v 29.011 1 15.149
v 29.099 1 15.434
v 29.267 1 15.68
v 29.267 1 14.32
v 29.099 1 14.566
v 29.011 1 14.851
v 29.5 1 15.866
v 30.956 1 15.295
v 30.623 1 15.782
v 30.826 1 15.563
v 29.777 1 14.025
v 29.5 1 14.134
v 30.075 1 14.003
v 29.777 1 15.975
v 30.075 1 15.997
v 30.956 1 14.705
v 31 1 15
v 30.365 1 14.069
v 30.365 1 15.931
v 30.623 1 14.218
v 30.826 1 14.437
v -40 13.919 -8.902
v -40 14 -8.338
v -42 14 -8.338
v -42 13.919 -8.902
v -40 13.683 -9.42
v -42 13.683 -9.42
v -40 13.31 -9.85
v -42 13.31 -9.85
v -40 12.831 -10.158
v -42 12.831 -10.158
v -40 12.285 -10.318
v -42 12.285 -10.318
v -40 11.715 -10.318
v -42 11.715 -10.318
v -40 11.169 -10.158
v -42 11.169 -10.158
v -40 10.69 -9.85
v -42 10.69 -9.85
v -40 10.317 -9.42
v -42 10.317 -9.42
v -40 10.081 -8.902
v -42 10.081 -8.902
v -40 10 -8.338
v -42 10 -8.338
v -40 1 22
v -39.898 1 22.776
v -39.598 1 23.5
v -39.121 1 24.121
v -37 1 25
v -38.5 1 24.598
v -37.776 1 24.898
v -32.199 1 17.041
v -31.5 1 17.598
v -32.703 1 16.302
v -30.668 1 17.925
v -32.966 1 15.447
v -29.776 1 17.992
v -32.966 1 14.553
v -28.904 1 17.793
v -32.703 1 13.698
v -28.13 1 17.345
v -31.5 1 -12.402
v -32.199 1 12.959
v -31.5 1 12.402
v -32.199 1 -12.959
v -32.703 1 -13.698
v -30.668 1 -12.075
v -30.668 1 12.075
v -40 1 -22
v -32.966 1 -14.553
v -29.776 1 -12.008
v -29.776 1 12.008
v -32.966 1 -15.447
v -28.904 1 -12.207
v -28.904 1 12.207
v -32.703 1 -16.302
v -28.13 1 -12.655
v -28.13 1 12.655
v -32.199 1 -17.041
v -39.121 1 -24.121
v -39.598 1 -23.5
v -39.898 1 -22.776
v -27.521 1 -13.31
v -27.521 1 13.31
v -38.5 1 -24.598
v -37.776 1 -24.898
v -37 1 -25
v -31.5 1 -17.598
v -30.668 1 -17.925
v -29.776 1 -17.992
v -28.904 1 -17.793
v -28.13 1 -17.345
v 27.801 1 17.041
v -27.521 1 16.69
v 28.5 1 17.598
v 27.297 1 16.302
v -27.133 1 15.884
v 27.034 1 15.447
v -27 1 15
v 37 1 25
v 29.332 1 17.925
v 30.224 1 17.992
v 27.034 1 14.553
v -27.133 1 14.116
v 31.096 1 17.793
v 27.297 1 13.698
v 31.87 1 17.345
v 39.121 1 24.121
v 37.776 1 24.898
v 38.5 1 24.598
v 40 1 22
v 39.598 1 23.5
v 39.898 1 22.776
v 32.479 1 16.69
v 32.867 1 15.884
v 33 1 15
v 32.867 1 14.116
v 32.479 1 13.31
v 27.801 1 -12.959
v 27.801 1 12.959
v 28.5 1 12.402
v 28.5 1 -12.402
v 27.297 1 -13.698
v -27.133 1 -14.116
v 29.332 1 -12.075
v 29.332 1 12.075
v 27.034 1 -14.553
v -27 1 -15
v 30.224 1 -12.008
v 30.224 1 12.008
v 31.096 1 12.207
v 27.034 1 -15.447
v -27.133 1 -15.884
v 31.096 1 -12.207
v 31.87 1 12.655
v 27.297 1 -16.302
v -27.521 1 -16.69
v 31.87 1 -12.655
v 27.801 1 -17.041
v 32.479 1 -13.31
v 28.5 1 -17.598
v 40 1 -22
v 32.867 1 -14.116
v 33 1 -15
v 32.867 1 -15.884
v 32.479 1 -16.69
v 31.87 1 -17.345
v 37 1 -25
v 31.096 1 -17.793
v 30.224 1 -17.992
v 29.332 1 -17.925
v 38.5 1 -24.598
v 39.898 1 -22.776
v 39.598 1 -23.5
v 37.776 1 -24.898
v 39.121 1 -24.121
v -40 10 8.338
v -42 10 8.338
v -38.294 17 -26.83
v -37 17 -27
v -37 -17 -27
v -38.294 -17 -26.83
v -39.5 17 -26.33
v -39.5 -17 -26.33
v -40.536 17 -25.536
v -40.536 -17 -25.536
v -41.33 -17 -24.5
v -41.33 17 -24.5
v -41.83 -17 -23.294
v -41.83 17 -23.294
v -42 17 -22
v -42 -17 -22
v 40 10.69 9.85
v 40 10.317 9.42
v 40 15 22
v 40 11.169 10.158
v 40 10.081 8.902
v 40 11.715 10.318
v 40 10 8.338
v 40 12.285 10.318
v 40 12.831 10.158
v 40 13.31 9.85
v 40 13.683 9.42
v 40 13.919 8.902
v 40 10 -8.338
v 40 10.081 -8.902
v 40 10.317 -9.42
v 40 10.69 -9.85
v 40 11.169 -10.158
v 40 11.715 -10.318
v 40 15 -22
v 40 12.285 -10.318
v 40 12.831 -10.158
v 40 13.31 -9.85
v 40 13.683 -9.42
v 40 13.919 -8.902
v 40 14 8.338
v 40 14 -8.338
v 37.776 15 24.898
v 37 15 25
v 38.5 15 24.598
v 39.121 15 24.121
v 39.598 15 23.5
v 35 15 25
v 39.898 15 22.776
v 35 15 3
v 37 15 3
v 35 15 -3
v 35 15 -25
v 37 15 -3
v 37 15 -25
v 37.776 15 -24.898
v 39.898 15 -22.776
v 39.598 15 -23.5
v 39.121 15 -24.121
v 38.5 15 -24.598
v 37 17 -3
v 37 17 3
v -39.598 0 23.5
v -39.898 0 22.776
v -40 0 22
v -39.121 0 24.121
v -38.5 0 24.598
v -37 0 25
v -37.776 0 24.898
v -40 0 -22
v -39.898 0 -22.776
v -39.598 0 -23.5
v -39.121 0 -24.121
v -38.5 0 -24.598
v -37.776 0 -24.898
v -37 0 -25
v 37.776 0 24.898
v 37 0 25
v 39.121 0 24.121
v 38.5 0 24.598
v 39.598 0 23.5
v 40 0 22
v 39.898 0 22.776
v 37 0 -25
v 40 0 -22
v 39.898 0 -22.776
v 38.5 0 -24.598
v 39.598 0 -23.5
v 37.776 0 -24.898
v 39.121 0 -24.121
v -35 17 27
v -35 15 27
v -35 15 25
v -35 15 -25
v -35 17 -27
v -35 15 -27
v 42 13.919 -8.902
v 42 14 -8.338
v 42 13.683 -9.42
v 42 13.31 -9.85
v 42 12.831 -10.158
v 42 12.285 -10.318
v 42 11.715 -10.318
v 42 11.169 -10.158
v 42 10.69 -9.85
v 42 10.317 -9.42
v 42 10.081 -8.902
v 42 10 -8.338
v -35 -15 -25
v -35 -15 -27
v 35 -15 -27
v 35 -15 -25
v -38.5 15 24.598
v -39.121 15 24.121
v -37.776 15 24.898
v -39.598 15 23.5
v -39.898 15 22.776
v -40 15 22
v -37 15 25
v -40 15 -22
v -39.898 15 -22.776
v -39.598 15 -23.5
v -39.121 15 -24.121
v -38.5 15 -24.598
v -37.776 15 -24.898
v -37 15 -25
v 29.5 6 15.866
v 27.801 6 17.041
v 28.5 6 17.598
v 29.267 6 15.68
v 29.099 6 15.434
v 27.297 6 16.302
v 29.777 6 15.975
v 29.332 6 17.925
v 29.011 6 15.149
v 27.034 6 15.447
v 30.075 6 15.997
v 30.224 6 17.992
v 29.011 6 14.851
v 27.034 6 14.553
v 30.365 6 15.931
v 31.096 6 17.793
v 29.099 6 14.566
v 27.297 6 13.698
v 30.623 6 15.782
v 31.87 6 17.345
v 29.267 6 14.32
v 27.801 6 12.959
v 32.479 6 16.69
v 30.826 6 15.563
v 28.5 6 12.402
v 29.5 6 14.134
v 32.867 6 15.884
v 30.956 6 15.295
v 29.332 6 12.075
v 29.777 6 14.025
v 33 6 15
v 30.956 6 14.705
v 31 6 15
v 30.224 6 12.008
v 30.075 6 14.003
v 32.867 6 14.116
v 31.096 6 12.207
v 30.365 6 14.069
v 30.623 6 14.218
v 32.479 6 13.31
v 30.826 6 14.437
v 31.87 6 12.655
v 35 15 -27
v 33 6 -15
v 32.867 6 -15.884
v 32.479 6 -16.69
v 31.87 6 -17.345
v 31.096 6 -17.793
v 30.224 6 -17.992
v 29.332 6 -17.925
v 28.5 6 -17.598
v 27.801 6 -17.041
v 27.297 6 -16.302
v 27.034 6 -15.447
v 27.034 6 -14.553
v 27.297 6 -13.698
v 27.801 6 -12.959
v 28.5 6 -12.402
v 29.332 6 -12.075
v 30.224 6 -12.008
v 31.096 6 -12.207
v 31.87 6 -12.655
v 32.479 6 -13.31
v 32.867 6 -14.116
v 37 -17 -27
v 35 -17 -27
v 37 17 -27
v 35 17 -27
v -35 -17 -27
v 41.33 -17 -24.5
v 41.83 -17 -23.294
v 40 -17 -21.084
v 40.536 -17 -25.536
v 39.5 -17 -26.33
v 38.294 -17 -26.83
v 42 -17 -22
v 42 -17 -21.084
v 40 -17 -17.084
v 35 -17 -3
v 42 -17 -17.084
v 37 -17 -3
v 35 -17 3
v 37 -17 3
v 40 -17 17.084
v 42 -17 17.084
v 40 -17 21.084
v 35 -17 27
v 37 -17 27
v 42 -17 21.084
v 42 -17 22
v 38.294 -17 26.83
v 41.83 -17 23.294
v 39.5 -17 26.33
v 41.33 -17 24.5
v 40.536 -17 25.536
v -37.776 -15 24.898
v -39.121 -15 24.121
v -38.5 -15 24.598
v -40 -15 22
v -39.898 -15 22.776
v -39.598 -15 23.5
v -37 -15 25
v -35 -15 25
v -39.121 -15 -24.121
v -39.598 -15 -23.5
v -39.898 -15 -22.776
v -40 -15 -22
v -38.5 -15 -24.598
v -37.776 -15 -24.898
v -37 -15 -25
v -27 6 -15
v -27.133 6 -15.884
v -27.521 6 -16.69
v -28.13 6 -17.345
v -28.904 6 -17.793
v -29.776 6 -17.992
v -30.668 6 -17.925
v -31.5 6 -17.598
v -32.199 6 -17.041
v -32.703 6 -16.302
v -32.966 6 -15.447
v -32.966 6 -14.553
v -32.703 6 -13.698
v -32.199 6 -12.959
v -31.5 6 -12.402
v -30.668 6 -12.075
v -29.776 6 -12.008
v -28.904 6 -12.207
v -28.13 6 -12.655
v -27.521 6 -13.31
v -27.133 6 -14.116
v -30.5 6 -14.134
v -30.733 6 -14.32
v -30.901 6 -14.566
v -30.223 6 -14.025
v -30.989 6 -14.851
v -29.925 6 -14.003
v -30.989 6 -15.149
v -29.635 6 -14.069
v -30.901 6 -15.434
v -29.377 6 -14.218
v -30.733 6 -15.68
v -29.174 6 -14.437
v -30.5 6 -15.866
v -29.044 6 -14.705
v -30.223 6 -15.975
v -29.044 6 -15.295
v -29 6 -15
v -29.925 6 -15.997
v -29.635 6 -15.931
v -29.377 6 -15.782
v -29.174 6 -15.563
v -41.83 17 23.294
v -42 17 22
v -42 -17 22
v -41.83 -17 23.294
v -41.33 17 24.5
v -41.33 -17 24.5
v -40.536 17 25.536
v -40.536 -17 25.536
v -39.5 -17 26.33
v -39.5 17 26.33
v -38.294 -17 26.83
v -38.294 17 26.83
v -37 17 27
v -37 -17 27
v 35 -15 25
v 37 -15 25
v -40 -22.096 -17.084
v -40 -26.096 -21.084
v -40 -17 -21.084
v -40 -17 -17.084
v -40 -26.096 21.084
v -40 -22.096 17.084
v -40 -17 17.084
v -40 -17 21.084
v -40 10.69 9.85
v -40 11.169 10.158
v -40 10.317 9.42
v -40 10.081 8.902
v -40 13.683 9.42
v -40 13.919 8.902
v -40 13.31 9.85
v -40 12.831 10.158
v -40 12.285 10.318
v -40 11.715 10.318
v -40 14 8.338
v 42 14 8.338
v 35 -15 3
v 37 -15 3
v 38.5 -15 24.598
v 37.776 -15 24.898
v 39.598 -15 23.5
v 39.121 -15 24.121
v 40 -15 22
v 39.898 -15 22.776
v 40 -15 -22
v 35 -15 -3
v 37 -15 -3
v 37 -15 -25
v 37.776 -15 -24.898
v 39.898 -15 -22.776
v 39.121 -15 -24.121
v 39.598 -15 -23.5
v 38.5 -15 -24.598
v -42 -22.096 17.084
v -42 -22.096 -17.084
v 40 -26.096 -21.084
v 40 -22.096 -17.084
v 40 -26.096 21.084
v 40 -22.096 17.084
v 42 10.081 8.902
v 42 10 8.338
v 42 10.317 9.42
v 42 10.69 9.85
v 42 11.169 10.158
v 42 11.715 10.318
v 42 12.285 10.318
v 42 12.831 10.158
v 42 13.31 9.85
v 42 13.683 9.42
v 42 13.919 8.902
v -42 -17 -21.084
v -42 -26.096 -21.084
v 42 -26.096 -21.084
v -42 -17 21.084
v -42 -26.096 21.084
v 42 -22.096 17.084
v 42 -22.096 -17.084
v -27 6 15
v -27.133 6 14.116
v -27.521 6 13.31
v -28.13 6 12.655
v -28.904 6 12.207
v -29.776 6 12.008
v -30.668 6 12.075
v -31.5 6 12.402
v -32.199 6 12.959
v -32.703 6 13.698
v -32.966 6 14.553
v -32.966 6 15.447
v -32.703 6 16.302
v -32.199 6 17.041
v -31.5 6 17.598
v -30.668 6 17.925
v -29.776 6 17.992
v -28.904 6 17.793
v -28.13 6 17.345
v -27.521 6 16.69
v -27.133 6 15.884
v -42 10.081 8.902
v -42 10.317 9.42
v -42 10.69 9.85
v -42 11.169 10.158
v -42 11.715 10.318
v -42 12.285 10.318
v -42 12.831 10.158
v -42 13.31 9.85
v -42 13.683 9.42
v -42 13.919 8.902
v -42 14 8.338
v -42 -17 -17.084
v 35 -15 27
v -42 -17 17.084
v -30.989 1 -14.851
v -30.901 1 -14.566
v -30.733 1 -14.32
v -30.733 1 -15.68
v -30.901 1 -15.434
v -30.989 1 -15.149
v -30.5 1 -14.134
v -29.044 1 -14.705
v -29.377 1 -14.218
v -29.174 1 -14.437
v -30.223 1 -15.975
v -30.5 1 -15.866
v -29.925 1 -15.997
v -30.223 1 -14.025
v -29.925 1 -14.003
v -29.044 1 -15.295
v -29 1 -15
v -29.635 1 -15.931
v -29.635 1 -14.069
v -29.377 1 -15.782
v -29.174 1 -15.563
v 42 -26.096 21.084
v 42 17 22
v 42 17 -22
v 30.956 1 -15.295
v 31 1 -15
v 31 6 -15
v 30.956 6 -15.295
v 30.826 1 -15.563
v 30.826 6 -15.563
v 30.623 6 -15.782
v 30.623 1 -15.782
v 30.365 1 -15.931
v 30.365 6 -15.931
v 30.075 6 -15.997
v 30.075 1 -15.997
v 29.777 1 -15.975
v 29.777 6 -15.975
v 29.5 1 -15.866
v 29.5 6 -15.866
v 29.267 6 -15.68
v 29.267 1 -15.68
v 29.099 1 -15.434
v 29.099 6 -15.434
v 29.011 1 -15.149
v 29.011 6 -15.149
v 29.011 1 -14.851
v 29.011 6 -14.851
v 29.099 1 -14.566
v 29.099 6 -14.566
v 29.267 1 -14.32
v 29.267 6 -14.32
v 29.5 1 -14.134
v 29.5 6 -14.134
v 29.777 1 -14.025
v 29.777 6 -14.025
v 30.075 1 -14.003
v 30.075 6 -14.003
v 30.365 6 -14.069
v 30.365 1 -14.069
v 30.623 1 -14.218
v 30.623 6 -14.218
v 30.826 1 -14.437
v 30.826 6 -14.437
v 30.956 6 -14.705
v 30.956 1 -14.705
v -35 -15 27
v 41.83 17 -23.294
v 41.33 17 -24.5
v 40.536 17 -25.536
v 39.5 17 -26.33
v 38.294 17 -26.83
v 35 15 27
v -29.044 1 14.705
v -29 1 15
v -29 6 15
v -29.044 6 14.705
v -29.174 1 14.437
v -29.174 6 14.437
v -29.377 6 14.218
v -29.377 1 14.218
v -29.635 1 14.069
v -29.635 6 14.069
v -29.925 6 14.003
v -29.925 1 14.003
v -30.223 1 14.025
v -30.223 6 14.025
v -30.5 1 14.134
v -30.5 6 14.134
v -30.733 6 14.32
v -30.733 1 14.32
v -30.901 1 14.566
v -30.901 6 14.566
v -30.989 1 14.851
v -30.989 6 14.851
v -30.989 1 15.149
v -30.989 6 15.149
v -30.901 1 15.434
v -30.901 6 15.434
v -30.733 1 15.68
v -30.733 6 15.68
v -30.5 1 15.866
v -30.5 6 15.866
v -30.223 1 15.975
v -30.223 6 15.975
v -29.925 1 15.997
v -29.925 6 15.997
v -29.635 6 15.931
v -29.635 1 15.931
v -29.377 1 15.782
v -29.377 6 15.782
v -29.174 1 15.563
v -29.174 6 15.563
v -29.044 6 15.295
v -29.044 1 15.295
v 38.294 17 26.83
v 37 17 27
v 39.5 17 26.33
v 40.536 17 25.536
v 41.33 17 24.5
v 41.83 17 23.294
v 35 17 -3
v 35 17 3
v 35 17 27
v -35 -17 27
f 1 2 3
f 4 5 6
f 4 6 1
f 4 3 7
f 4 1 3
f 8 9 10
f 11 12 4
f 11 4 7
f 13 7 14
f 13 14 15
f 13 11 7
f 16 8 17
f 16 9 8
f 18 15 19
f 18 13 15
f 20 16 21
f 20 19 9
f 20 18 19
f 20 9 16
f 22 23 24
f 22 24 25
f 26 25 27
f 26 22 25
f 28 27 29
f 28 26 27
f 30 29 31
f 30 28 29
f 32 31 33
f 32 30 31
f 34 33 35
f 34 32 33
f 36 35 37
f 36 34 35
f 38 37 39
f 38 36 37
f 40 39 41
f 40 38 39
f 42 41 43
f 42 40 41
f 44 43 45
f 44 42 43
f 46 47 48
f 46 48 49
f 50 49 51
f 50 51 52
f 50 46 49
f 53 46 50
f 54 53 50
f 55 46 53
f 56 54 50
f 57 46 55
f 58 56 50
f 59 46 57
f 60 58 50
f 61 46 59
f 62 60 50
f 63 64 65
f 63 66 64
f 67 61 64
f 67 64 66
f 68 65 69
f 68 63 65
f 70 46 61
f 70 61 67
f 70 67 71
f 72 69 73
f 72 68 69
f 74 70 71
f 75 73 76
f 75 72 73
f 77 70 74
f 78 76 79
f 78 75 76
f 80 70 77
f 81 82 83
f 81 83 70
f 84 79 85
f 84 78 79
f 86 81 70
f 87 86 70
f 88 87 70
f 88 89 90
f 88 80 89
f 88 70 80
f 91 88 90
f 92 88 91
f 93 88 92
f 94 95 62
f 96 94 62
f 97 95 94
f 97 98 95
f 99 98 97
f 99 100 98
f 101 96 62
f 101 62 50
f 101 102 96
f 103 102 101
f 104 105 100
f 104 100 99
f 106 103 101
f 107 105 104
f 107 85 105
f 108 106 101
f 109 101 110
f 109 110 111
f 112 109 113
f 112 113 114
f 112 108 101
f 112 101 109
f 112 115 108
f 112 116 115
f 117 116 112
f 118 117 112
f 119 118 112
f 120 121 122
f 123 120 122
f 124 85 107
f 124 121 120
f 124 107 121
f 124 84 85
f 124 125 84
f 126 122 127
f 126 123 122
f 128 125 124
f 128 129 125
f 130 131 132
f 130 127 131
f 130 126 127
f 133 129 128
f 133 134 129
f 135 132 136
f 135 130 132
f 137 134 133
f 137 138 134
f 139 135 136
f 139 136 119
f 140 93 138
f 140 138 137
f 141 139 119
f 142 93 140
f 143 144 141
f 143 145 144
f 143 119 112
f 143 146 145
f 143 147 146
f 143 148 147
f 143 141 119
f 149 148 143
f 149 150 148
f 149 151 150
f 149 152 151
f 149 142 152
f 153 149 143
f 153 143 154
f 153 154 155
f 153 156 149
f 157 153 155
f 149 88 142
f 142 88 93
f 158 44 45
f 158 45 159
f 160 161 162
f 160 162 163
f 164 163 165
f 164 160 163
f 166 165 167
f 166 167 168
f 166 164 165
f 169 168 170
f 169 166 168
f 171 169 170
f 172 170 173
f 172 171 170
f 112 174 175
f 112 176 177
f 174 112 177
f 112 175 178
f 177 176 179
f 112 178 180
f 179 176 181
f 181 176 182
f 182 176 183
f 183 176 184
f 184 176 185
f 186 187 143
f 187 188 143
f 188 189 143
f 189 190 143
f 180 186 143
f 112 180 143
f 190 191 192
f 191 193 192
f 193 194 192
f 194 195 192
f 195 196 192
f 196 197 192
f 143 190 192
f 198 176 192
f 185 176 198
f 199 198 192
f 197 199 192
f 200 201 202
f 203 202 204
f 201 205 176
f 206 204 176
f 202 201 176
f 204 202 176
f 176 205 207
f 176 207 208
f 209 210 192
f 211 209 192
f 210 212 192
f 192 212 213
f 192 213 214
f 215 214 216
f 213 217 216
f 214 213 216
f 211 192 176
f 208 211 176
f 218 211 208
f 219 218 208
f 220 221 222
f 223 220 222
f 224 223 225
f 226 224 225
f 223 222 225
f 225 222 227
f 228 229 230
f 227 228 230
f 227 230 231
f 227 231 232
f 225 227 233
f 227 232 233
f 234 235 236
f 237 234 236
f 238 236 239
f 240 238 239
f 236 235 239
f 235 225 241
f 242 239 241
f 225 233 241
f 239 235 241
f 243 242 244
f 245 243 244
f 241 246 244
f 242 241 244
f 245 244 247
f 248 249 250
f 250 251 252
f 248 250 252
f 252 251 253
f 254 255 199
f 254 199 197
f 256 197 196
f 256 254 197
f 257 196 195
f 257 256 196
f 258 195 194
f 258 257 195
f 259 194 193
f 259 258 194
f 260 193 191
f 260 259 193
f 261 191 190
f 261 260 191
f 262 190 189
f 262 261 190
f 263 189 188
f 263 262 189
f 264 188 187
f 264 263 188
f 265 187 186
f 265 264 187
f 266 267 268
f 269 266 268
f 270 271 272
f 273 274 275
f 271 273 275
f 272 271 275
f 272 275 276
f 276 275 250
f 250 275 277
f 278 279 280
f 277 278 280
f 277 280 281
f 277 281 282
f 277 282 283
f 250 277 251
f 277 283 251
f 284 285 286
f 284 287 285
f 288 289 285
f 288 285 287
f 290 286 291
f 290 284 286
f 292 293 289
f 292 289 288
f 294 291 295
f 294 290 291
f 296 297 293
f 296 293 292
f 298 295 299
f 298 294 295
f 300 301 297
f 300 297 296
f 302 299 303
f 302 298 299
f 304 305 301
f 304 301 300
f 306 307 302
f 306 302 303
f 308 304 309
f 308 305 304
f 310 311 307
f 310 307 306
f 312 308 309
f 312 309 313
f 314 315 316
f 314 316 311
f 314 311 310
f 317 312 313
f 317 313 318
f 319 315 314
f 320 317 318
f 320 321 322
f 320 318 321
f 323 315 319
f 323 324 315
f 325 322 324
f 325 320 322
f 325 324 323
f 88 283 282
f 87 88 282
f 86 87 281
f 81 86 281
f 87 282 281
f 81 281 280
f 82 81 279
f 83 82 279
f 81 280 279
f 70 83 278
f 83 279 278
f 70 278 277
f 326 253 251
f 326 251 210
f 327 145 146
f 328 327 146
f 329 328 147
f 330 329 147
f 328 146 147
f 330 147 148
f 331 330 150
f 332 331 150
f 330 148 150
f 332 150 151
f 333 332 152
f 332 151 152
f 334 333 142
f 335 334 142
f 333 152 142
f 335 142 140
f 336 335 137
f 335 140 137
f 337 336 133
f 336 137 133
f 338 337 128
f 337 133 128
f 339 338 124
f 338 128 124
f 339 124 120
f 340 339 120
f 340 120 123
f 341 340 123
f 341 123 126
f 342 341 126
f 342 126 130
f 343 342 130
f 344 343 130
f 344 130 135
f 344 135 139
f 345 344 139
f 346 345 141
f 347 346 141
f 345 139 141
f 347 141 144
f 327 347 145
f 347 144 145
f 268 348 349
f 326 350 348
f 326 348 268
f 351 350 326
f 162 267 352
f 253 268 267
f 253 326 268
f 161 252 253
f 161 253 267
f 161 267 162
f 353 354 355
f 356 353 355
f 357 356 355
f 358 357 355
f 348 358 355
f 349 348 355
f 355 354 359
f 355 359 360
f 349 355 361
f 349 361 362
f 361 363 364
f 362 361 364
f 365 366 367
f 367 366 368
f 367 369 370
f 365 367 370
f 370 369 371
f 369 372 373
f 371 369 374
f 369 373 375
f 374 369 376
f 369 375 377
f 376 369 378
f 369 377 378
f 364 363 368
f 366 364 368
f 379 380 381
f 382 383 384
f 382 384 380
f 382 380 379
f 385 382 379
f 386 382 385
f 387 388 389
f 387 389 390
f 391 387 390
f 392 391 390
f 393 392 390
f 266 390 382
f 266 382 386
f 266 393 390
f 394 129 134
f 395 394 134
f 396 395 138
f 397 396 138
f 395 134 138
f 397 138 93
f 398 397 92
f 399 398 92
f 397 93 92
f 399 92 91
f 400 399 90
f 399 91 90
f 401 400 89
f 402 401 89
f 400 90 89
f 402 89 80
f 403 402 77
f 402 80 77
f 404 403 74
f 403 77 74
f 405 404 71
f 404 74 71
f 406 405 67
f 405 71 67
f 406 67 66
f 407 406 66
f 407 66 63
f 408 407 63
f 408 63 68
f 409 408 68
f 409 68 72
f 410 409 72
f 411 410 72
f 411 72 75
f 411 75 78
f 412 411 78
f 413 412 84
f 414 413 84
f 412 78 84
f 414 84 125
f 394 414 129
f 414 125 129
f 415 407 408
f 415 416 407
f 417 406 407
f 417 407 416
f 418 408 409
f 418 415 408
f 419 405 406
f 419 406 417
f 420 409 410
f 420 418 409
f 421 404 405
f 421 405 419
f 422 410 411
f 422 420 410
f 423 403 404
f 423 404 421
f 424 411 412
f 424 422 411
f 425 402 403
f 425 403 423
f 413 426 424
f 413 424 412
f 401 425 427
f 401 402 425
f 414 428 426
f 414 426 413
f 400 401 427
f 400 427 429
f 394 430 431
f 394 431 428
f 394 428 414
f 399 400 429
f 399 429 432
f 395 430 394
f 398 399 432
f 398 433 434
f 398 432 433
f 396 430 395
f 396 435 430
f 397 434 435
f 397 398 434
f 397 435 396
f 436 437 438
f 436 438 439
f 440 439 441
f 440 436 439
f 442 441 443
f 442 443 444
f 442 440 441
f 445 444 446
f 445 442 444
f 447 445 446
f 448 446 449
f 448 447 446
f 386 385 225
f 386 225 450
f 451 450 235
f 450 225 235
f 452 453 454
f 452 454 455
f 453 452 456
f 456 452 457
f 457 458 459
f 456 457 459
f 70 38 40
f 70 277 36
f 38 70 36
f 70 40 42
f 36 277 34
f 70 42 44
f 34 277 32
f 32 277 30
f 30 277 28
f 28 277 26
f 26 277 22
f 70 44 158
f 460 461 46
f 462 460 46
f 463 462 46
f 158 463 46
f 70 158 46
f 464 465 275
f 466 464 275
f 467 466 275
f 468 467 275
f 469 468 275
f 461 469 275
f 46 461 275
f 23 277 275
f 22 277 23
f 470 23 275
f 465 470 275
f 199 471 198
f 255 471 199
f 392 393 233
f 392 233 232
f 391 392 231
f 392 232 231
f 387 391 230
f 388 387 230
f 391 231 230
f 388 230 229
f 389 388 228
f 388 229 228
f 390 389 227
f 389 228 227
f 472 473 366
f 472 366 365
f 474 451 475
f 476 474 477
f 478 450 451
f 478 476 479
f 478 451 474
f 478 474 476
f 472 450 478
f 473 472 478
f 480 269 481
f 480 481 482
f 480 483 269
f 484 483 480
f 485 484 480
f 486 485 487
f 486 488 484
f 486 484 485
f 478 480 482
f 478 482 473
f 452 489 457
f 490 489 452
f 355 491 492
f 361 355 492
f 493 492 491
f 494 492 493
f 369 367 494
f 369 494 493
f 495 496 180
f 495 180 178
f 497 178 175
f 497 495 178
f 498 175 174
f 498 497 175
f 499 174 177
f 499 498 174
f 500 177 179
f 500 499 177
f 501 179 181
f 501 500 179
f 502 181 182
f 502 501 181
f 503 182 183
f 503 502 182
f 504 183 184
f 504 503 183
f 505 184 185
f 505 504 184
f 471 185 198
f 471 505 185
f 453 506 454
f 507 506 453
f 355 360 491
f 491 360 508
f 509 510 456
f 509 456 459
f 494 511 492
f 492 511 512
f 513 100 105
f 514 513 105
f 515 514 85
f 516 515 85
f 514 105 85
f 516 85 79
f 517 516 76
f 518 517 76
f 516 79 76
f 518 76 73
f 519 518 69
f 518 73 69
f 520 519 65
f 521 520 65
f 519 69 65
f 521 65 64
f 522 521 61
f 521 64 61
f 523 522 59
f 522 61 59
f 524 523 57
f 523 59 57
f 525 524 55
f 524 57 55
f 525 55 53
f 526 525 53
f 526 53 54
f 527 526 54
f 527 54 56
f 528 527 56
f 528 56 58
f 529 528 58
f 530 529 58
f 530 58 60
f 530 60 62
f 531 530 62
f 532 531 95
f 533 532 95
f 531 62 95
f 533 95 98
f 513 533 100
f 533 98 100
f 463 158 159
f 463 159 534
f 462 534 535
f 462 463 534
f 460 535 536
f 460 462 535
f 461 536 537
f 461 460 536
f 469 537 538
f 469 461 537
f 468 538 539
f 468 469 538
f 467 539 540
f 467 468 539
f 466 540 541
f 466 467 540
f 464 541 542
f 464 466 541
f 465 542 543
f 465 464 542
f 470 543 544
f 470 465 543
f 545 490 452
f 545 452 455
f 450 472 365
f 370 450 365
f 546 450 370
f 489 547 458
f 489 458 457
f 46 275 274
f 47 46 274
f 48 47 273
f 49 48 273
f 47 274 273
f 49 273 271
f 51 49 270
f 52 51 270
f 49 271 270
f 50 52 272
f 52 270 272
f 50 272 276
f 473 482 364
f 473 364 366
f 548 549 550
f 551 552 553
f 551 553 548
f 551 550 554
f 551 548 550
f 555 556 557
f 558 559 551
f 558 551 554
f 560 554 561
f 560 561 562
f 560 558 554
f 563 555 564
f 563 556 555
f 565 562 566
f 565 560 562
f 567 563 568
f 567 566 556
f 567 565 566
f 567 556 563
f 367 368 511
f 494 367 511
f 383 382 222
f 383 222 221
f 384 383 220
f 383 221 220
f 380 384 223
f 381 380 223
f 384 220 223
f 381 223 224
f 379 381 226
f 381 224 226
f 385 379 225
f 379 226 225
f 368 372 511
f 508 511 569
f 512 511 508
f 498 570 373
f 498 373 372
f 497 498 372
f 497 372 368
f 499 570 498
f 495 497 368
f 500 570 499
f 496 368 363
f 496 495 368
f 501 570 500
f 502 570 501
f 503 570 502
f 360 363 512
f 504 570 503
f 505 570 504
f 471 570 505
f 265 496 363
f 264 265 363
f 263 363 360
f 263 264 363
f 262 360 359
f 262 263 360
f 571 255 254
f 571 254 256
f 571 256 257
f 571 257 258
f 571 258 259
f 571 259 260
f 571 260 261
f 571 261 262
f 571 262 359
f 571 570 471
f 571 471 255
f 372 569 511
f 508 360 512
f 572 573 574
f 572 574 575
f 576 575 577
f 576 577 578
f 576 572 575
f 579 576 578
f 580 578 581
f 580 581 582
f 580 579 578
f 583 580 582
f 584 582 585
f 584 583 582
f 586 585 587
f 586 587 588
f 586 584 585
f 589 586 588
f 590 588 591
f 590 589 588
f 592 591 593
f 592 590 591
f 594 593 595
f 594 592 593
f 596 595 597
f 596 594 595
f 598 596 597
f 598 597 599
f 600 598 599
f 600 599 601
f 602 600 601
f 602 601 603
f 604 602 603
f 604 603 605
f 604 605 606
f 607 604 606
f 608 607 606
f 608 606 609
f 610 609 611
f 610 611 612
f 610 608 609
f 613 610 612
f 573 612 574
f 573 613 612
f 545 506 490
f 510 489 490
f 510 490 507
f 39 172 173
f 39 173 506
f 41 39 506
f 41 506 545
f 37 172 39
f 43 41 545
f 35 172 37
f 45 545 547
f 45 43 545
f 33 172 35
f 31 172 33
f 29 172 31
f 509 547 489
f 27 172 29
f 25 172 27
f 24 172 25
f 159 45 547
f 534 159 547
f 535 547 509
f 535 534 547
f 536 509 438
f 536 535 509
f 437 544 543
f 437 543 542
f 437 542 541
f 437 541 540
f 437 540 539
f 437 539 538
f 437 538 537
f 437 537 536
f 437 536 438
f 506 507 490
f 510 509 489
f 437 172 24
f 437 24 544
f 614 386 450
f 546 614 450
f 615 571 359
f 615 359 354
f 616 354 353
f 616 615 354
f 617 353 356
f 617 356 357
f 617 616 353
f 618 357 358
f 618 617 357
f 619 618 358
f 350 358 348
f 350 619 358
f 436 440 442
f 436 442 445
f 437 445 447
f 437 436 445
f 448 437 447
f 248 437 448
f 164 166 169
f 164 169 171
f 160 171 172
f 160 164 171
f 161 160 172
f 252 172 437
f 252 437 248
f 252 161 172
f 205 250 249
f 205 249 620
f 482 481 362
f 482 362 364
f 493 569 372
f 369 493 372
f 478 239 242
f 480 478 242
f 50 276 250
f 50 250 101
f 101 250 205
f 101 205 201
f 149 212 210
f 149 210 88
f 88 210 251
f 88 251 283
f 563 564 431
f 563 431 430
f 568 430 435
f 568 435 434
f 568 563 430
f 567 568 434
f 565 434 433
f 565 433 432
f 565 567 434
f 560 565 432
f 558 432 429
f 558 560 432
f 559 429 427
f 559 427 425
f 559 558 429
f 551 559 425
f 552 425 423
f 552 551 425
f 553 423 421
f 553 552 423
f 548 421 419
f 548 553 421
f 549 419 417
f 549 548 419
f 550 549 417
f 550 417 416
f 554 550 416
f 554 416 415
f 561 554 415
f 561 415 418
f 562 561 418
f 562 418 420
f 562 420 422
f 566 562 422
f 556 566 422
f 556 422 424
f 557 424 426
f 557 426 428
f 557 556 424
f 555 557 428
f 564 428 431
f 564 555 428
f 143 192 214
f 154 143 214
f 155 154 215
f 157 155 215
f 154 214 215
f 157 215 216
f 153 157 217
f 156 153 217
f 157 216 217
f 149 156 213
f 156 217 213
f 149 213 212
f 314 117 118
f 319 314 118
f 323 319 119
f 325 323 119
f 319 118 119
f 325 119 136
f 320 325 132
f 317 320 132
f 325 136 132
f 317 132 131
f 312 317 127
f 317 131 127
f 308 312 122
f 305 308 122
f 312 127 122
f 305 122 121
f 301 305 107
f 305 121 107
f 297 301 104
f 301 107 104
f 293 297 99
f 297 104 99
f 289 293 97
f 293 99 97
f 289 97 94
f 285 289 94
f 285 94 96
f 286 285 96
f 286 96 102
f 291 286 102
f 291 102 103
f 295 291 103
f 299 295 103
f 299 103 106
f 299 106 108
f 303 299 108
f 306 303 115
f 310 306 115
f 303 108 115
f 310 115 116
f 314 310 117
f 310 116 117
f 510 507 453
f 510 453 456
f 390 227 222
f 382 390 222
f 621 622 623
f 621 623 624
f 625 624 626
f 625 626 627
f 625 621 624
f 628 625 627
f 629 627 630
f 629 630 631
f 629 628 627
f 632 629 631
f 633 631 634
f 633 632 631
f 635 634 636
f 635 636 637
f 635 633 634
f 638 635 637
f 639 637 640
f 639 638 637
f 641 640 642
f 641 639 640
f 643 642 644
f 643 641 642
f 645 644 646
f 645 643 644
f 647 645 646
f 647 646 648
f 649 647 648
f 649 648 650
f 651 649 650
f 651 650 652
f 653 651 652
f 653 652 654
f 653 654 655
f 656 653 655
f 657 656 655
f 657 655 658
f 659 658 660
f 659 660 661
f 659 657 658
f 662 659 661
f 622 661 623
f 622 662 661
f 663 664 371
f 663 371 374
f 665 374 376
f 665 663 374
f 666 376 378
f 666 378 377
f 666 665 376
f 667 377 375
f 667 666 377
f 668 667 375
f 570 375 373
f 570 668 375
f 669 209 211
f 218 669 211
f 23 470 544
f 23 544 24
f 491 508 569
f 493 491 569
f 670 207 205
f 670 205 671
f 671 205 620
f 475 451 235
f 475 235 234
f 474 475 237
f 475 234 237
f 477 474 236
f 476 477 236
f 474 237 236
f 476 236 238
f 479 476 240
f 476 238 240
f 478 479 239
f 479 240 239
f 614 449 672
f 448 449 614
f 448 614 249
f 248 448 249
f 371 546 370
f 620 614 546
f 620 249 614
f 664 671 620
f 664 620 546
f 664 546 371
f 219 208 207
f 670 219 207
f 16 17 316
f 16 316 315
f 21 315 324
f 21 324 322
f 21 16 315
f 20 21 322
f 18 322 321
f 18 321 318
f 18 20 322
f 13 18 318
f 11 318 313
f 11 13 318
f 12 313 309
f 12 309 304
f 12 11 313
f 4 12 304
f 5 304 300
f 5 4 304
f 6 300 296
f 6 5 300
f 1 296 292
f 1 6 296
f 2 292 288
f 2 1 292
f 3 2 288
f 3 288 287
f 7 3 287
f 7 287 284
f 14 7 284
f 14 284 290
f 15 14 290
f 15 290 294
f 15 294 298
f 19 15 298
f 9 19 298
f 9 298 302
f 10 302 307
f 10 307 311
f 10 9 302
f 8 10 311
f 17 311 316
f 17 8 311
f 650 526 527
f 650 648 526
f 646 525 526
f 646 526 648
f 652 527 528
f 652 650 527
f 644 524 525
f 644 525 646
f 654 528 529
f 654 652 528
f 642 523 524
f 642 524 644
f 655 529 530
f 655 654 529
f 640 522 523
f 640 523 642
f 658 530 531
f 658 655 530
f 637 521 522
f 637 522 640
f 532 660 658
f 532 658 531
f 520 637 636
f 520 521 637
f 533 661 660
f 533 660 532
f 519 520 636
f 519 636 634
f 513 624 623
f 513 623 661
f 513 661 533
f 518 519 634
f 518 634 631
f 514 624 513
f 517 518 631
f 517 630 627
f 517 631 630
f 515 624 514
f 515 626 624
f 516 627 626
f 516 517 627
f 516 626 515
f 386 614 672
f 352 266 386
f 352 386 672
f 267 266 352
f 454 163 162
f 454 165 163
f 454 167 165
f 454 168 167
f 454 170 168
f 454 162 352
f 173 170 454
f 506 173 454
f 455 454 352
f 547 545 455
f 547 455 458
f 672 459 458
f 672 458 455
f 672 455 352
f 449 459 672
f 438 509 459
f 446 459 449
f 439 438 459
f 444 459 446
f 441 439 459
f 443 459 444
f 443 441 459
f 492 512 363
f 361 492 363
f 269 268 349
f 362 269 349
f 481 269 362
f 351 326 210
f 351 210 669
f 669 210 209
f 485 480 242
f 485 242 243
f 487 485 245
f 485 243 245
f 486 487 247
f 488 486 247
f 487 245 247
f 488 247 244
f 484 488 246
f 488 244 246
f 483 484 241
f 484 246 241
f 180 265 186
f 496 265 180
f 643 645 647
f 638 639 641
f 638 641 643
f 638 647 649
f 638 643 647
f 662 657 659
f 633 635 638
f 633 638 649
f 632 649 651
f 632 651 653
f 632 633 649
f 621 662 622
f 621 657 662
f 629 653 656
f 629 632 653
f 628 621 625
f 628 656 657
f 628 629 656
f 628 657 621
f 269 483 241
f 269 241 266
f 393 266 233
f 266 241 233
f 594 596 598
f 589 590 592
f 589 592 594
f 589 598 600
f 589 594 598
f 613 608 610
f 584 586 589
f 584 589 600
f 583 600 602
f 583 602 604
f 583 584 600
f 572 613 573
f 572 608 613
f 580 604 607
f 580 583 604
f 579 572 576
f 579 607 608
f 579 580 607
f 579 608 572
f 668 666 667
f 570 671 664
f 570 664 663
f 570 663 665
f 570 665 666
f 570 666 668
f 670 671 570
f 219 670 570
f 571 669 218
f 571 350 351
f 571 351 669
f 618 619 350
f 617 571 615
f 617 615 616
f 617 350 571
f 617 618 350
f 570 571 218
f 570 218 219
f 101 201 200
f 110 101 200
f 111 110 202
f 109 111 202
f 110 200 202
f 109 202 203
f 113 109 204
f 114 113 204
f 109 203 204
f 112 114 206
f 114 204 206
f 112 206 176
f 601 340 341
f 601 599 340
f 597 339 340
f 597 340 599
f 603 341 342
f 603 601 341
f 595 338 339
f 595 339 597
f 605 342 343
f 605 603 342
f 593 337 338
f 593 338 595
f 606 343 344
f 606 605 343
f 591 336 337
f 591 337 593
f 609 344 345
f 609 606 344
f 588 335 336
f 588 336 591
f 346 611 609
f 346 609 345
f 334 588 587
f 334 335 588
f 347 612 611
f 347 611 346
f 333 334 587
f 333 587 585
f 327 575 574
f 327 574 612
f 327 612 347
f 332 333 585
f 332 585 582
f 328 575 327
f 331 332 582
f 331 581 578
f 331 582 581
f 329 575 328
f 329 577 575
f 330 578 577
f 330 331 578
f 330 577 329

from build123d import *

# Parameters (mm, degrees)
EXTRUDE_THIN1_DEPTH      = 15
EXTRUDE_THIN1_DEPTH_BACK = 15
BOSS_EXTRUDE1_DEPTH      = 1
SKETCH3_R                = 3
SKETCH3_R_2              = 1
BOSS_EXTRUDE2_DEPTH      = 5
BOSS_EXTRUDE3_DEPTH      = 2
BOSS_EXTRUDE4_START      = -30
BOSS_EXTRUDE4_DEPTH      = 2
SKETCH5_W                = 34.167254682
SKETCH5_H                = 5.095662734
BOSS_EXTRUDE5_DEPTH      = 2
BOSS_EXTRUDE6_START      = -84
SKETCH5_3_W              = 34.167254682
SKETCH5_3_H              = 5.095662734
BOSS_EXTRUDE6_DEPTH      = 2
CUT_EXTRUDE1_DEPTH       = 85


with BuildPart() as part:
    # Sketch1 → Extrude-Thin1 (new body, two sides)
    with BuildSketch(Plane(origin=(0, 0, 0), x_dir=(1, 0, 0), z_dir=(0, 1, 0))) as extrude_thin1_sk:
        with BuildLine():
            Line((-42, 22), (-42, -22))
            ThreePointArc((-42, -22), (-40.535533906, -25.535533906), (-37, -27))
            Line((-37, -27), (37, -27))
            ThreePointArc((37, -27), (40.535533906, -25.535533906), (42, -22))
            Line((42, -22), (42, 22))
            ThreePointArc((42, 22), (40.535533906, 25.535533906), (37, 27))
            Line((37, 27), (-37, 27))
            ThreePointArc((-37, 27), (-40.535533906, 25.535533906), (-42, 22))
        make_face()
        with BuildLine():
            Line((-40, 22), (-40, -22))
            ThreePointArc((-40, -22), (-39.121320344, -24.121320344), (-37, -25))
            Line((-37, -25), (37, -25))
            ThreePointArc((37, -25), (39.121320344, -24.121320344), (40, -22))
            Line((40, -22), (40, 22))
            ThreePointArc((40, 22), (39.121320344, 24.121320344), (37, 25))
            Line((37, 25), (-37, 25))
            ThreePointArc((-37, 25), (-39.121320344, 24.121320344), (-40, 22))
        make_face(mode=Mode.SUBTRACT)
    extrude(amount=EXTRUDE_THIN1_DEPTH)
    extrude(extrude_thin1_sk.sketch, amount=-EXTRUDE_THIN1_DEPTH_BACK)

    # Sketch1<2> → Boss-Extrude1 (add)
    with BuildSketch(Plane(origin=(0, 0, 0), x_dir=(1, 0, 0), z_dir=(0, 1, 0))):
        with BuildLine():
            Line((-37, -25), (37, -25))
            ThreePointArc((37, -25), (39.121320344, -24.121320344), (40, -22))
            Line((40, -22), (40, 22))
            ThreePointArc((40, 22), (39.121320344, 24.121320344), (37, 25))
            Line((37, 25), (-37, 25))
            ThreePointArc((-37, 25), (-39.121320344, 24.121320344), (-40, 22))
            Line((-40, 22), (-40, -22))
            ThreePointArc((-40, -22), (-39.121320344, -24.121320344), (-37, -25))
        make_face()
    extrude(amount=BOSS_EXTRUDE1_DEPTH)

    # Sketch3 → Boss-Extrude2 (add)
    with BuildSketch(Plane(origin=(0, 1, 0), x_dir=(1, 0, 0), z_dir=(0, 1, 0))):
        with Locations((-30, 15)):
            Circle(SKETCH3_R)
        with Locations((-30, 15)):
            Circle(SKETCH3_R_2, mode=Mode.SUBTRACT)
        with Locations((30, 15)):
            Circle(SKETCH3_R)
        with Locations((30, 15)):
            Circle(SKETCH3_R_2, mode=Mode.SUBTRACT)
        with Locations((30, -15)):
            Circle(SKETCH3_R)
        with Locations((30, -15)):
            Circle(SKETCH3_R_2, mode=Mode.SUBTRACT)
        with Locations((-30, -15)):
            Circle(SKETCH3_R)
        with Locations((-30, -15)):
            Circle(SKETCH3_R_2, mode=Mode.SUBTRACT)
    extrude(amount=BOSS_EXTRUDE2_DEPTH)

    # Sketch4 → Boss-Extrude3 (add)
    with BuildSketch(Plane(origin=(0, 15, 0), x_dir=(1, 0, 0), z_dir=(0, 1, 0))):
        with BuildLine():
            Line((-35, 25), (-35, 27))
            Line((-35, 27), (-37, 27))
            ThreePointArc((-37, 27), (-40.535533906, 25.535533906), (-42, 22))
            Line((-42, 22), (-42, -22))
            ThreePointArc((-42, -22), (-40.535533906, -25.535533906), (-37, -27))
            Line((-37, -27), (-35, -27))
            Line((-35, -27), (-35, -25))
            Line((-35, -25), (-37, -25))
            ThreePointArc((-37, -25), (-39.121320344, -24.121320344), (-40, -22))
            Line((-40, -22), (-40, 22))
            ThreePointArc((-40, 22), (-39.121320344, 24.121320344), (-37, 25))
            Line((-37, 25), (-35, 25))
        make_face()
        with BuildLine():
            Line((-35, -25), (-35, 25))
            Line((-35, 25), (-37, 25))
            ThreePointArc((-37, 25), (-39.121320344, 24.121320344), (-40, 22))
            Line((-40, 22), (-40, -22))
            ThreePointArc((-40, -22), (-39.121320344, -24.121320344), (-37, -25))
            Line((-37, -25), (-35, -25))
        make_face()
        with BuildLine():
            Line((37, 25), (35, 25))
            Line((35, 25), (35, 3))
            Line((35, 3), (37, 3))
            Line((37, 3), (37, -3))
            Line((37, -3), (35, -3))
            Line((35, -3), (35, -25))
            Line((35, -25), (37, -25))
            ThreePointArc((37, -25), (39.121320344, -24.121320344), (40, -22))
            Line((40, -22), (40, 22))
            ThreePointArc((40, 22), (39.121320344, 24.121320344), (37, 25))
        make_face()
        with BuildLine():
            Line((37, 27), (35, 27))
            Line((35, 27), (35, 25))
            Line((35, 25), (37, 25))
            ThreePointArc((37, 25), (39.121320344, 24.121320344), (40, 22))
            Line((40, 22), (40, -22))
            ThreePointArc((40, -22), (39.121320344, -24.121320344), (37, -25))
            Line((37, -25), (35, -25))
            Line((35, -25), (35, -27))
            Line((35, -27), (37, -27))
            ThreePointArc((37, -27), (40.535533906, -25.535533906), (42, -22))
            Line((42, -22), (42, 22))
            ThreePointArc((42, 22), (40.535533906, 25.535533906), (37, 27))
        make_face()
    extrude(amount=BOSS_EXTRUDE3_DEPTH)

    # Sketch4<3> → Boss-Extrude4 (add)
    with BuildSketch(Plane(origin=(0, 15, 0), x_dir=(1, 0, 0), z_dir=(0, 1, 0)).offset(BOSS_EXTRUDE4_START)):
        with BuildLine():
            Line((-35, -25), (-35, 25))
            Line((-35, 25), (-37, 25))
            ThreePointArc((-37, 25), (-39.121320344, 24.121320344), (-40, 22))
            Line((-40, 22), (-40, -22))
            ThreePointArc((-40, -22), (-39.121320344, -24.121320344), (-37, -25))
            Line((-37, -25), (-35, -25))
        make_face()
        with BuildLine():
            Line((-35, 25), (-35, 27))
            Line((-35, 27), (-37, 27))
            ThreePointArc((-37, 27), (-40.535533906, 25.535533906), (-42, 22))
            Line((-42, 22), (-42, -22))
            ThreePointArc((-42, -22), (-40.535533906, -25.535533906), (-37, -27))
            Line((-37, -27), (-35, -27))
            Line((-35, -27), (-35, -25))
            Line((-35, -25), (-37, -25))
            ThreePointArc((-37, -25), (-39.121320344, -24.121320344), (-40, -22))
            Line((-40, -22), (-40, 22))
            ThreePointArc((-40, 22), (-39.121320344, 24.121320344), (-37, 25))
            Line((-37, 25), (-35, 25))
        make_face()
        with BuildLine():
            Line((37, 25), (35, 25))
            Line((35, 25), (35, 3))
            Line((35, 3), (37, 3))
            Line((37, 3), (37, -3))
            Line((37, -3), (35, -3))
            Line((35, -3), (35, -25))
            Line((35, -25), (37, -25))
            ThreePointArc((37, -25), (39.121320344, -24.121320344), (40, -22))
            Line((40, -22), (40, 22))
            ThreePointArc((40, 22), (39.121320344, 24.121320344), (37, 25))
        make_face()
        with BuildLine():
            Line((37, 27), (35, 27))
            Line((35, 27), (35, 25))
            Line((35, 25), (37, 25))
            ThreePointArc((37, 25), (39.121320344, 24.121320344), (40, 22))
            Line((40, 22), (40, -22))
            ThreePointArc((40, -22), (39.121320344, -24.121320344), (37, -25))
            Line((37, -25), (35, -25))
            Line((35, -25), (35, -27))
            Line((35, -27), (37, -27))
            ThreePointArc((37, -27), (40.535533906, -25.535533906), (42, -22))
            Line((42, -22), (42, 22))
            ThreePointArc((42, 22), (40.535533906, 25.535533906), (37, 27))
        make_face()
    extrude(amount=-BOSS_EXTRUDE4_DEPTH)

    # Sketch5 → Boss-Extrude5 (add)
    with BuildSketch(Plane.ZY.offset(42)):
        Polygon((21.083627341, -7.904337266), (-21.083627341, -7.904337266), (-21.083627341, -17), (-17.083627341, -17), (-17.083627341, -11.904337266), (17.083627341, -11.904337266), (17.083627341, -17), (21.083627341, -17), align=None)
        Polygon((-17.083627341, -17), (-21.083627341, -17), (-21.083627341, -26.095662734), (21.083627341, -26.095662734), (21.083627341, -17), (17.083627341, -17), (17.083627341, -22.095662734), (-17.083627341, -22.095662734), align=None)
        with Locations((0, -14.452168633)):
            Rectangle(SKETCH5_W, SKETCH5_H)
    extrude(amount=-BOSS_EXTRUDE5_DEPTH)

    # Sketch5<3> → Boss-Extrude6 (add)
    with BuildSketch(Plane.ZY.offset(42).offset(BOSS_EXTRUDE6_START)):
        Polygon((21.083627341, -7.904337266), (-21.083627341, -7.904337266), (-21.083627341, -17), (-17.083627341, -17), (-17.083627341, -11.904337266), (17.083627341, -11.904337266), (17.083627341, -17), (21.083627341, -17), align=None)
        with Locations((0, -14.452168633)):
            Rectangle(SKETCH5_3_W, SKETCH5_3_H)
        Polygon((-17.083627341, -17), (-21.083627341, -17), (-21.083627341, -26.095662734), (21.083627341, -26.095662734), (21.083627341, -17), (17.083627341, -17), (17.083627341, -22.095662734), (-17.083627341, -22.095662734), align=None)
    extrude(amount=BOSS_EXTRUDE6_DEPTH)

    # Sketch7 → Cut-Extrude1 (cut, through all)
    with BuildSketch(Plane(origin=(42, 0, 0), x_dir=(0, 0, -1), z_dir=(1, 0, 0))):
        with BuildLine():
            Line((-8.338334794, 14), (8.338334794, 14))
            ThreePointArc((8.338334794, 14), (10.338334794, 12), (8.338334794, 10))
            Line((8.338334794, 10), (-8.338334794, 10))
            ThreePointArc((-8.338334794, 10), (-10.338334794, 12), (-8.338334794, 14))
        make_face()
    extrude(amount=-CUT_EXTRUDE1_DEPTH, mode=Mode.SUBTRACT)


solid = part.part
